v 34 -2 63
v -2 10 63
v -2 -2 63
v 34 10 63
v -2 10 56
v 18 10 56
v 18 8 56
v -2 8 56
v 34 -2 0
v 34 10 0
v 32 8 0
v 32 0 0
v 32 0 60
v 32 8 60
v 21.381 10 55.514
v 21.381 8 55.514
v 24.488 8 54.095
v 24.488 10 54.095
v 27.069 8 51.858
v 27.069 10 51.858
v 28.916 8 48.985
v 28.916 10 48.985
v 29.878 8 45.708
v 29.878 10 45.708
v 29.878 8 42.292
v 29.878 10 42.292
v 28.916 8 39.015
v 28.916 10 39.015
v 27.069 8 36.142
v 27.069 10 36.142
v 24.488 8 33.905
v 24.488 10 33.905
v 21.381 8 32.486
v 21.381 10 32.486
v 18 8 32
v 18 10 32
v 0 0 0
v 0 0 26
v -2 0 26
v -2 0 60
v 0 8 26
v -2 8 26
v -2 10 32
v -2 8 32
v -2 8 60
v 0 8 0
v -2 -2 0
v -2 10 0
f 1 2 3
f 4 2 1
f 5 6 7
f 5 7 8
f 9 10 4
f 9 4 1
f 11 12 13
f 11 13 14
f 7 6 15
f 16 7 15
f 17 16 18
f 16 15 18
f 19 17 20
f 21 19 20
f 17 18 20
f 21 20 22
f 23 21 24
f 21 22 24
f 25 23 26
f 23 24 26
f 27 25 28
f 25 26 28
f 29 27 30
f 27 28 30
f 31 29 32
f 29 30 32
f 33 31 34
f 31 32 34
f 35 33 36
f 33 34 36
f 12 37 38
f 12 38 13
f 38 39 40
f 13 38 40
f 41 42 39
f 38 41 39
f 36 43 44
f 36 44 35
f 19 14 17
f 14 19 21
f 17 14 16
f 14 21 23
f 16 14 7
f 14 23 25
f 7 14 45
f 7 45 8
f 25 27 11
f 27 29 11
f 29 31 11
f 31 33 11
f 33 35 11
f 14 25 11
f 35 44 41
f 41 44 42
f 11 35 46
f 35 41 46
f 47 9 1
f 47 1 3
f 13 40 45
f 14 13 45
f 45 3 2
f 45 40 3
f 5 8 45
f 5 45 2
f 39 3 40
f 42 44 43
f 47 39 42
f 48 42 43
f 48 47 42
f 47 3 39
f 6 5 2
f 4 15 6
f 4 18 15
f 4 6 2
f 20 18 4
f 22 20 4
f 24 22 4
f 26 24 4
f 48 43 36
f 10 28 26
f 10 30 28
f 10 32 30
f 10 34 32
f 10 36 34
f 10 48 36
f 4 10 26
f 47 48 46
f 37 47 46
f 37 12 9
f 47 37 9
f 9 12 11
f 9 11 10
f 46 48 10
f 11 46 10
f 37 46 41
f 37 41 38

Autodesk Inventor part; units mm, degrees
ref_plane "YZ Plane" through (0, 0, 0) normal (1, 0, 0) x (0, 1, 0)
ref_plane "XZ Plane" through (0, 0, 0) normal (0, 1, 0) x (-1, 0, 0)
ref_plane "XY Plane" through (0, 0, 0) normal (0, 0, 1) x (1, 0, 0)
sketch "Sketch1" plane through (0, 0, 0) normal (0, 0, 1) x (1, 0, 0)
  line L0 (0, 0) -> (32, 0)
  line L1 (32, 0) -> (32, 8)
  line L2 (32, 8) -> (0, 8)
  line L3 (0, 8) -> (0, 0)
  line L4 (-2, 10) -> (34, 10)
  line L5 (34, 10) -> (34, -2)
  line L6 (34, -2) -> (-2, -2)
  line L7 (-2, -2) -> (-2, 10)
  dimension "d0" = 32
  dimension "d1" = 8
  dimension "d2" = 2
  dimension "d3" = 2
  dimension "d4" = 2
  dimension "d5" = 2
extrude "Extrusion1" add sketch "Sketch1" along normal blind 60
sketch "Sketch3" plane through (0, 0, 60) normal (0, 0, 1) x (1, 0, 0)
  line L0 (34, 10) -> (-2, 10) projected
  line L1 (-2, -2) -> (34, -2) projected
  line L2 (34, -2) -> (34, 10) projected
  line L3 (34, 10) -> (-2, 10) projected
  line L4 (-2, 10) -> (-2, -2) projected
  line L5 (0, 0) -> (0, 8) projected
  line L6 (0, 8) -> (32, 8) projected
  line L7 (32, 8) -> (32, 0) projected
  line L8 (32, 0) -> (0, 0) projected
  point P0 (-2, 10)
extrude "Extrusion2" add sketch "Sketch3" along normal blind 3 contours L2 L1 L4 L0 | L5 L6 L7 L8
sketch "Sketch4" plane through (-2, -2, 0) normal (-1, 0, 0) x (0, 0, 1)
  line L0 (26, 2) -> (60, 2)
  line L1 (60, 2) -> (60, 10)
  line L2 (60, 10) -> (26, 10)
  line L3 (26, 10) -> (26, 2)
  line L4 (0, 12) -> (63, 12) projected
  line L5 (63, 12) -> (63, 0) projected
  point P0 (0, 2)
  point P1 (43, 10)
  dimension "d11" = 8
  dimension "d12" = 2
  dimension "d13" = 34
  dimension "d16" = 3
extrude "Extrusion3" cut sketch "Sketch4" against normal blind 3
sketch "Sketch2" plane through (-2, 10, 0) normal (0, 1, 0) x (1, 0, 0)
  line L0 (20, -44) -> (-20, -44) construction
  line L1 (20, -56) -> (-20, -56)
  line L2 (-20, -32) -> (20, -32)
  arc A0 (20, -56) -> (20, -32) centre (20, -44) ccw
  arc A1 (-20, -32) -> (-20, -56) centre (-20, -44) ccw
  line L3 (0, 0) -> (0, -63) projected
  point P0 (2, 0)
  point P1 (0, -44)
  point P2 (0, -26)
  point P3 (0, -60)
  point P4 (0, -32)
  point P5 (0, -56)
  dimension "d8" = 24
  dimension "d17" = 18
  dimension "d18" = 20
  dimension "d19" = 40
extrude "Extrusion4" cut sketch "Sketch2" against normal blind 3 contours L1 L3 L2 A0
properties part number "prototype2_2"
